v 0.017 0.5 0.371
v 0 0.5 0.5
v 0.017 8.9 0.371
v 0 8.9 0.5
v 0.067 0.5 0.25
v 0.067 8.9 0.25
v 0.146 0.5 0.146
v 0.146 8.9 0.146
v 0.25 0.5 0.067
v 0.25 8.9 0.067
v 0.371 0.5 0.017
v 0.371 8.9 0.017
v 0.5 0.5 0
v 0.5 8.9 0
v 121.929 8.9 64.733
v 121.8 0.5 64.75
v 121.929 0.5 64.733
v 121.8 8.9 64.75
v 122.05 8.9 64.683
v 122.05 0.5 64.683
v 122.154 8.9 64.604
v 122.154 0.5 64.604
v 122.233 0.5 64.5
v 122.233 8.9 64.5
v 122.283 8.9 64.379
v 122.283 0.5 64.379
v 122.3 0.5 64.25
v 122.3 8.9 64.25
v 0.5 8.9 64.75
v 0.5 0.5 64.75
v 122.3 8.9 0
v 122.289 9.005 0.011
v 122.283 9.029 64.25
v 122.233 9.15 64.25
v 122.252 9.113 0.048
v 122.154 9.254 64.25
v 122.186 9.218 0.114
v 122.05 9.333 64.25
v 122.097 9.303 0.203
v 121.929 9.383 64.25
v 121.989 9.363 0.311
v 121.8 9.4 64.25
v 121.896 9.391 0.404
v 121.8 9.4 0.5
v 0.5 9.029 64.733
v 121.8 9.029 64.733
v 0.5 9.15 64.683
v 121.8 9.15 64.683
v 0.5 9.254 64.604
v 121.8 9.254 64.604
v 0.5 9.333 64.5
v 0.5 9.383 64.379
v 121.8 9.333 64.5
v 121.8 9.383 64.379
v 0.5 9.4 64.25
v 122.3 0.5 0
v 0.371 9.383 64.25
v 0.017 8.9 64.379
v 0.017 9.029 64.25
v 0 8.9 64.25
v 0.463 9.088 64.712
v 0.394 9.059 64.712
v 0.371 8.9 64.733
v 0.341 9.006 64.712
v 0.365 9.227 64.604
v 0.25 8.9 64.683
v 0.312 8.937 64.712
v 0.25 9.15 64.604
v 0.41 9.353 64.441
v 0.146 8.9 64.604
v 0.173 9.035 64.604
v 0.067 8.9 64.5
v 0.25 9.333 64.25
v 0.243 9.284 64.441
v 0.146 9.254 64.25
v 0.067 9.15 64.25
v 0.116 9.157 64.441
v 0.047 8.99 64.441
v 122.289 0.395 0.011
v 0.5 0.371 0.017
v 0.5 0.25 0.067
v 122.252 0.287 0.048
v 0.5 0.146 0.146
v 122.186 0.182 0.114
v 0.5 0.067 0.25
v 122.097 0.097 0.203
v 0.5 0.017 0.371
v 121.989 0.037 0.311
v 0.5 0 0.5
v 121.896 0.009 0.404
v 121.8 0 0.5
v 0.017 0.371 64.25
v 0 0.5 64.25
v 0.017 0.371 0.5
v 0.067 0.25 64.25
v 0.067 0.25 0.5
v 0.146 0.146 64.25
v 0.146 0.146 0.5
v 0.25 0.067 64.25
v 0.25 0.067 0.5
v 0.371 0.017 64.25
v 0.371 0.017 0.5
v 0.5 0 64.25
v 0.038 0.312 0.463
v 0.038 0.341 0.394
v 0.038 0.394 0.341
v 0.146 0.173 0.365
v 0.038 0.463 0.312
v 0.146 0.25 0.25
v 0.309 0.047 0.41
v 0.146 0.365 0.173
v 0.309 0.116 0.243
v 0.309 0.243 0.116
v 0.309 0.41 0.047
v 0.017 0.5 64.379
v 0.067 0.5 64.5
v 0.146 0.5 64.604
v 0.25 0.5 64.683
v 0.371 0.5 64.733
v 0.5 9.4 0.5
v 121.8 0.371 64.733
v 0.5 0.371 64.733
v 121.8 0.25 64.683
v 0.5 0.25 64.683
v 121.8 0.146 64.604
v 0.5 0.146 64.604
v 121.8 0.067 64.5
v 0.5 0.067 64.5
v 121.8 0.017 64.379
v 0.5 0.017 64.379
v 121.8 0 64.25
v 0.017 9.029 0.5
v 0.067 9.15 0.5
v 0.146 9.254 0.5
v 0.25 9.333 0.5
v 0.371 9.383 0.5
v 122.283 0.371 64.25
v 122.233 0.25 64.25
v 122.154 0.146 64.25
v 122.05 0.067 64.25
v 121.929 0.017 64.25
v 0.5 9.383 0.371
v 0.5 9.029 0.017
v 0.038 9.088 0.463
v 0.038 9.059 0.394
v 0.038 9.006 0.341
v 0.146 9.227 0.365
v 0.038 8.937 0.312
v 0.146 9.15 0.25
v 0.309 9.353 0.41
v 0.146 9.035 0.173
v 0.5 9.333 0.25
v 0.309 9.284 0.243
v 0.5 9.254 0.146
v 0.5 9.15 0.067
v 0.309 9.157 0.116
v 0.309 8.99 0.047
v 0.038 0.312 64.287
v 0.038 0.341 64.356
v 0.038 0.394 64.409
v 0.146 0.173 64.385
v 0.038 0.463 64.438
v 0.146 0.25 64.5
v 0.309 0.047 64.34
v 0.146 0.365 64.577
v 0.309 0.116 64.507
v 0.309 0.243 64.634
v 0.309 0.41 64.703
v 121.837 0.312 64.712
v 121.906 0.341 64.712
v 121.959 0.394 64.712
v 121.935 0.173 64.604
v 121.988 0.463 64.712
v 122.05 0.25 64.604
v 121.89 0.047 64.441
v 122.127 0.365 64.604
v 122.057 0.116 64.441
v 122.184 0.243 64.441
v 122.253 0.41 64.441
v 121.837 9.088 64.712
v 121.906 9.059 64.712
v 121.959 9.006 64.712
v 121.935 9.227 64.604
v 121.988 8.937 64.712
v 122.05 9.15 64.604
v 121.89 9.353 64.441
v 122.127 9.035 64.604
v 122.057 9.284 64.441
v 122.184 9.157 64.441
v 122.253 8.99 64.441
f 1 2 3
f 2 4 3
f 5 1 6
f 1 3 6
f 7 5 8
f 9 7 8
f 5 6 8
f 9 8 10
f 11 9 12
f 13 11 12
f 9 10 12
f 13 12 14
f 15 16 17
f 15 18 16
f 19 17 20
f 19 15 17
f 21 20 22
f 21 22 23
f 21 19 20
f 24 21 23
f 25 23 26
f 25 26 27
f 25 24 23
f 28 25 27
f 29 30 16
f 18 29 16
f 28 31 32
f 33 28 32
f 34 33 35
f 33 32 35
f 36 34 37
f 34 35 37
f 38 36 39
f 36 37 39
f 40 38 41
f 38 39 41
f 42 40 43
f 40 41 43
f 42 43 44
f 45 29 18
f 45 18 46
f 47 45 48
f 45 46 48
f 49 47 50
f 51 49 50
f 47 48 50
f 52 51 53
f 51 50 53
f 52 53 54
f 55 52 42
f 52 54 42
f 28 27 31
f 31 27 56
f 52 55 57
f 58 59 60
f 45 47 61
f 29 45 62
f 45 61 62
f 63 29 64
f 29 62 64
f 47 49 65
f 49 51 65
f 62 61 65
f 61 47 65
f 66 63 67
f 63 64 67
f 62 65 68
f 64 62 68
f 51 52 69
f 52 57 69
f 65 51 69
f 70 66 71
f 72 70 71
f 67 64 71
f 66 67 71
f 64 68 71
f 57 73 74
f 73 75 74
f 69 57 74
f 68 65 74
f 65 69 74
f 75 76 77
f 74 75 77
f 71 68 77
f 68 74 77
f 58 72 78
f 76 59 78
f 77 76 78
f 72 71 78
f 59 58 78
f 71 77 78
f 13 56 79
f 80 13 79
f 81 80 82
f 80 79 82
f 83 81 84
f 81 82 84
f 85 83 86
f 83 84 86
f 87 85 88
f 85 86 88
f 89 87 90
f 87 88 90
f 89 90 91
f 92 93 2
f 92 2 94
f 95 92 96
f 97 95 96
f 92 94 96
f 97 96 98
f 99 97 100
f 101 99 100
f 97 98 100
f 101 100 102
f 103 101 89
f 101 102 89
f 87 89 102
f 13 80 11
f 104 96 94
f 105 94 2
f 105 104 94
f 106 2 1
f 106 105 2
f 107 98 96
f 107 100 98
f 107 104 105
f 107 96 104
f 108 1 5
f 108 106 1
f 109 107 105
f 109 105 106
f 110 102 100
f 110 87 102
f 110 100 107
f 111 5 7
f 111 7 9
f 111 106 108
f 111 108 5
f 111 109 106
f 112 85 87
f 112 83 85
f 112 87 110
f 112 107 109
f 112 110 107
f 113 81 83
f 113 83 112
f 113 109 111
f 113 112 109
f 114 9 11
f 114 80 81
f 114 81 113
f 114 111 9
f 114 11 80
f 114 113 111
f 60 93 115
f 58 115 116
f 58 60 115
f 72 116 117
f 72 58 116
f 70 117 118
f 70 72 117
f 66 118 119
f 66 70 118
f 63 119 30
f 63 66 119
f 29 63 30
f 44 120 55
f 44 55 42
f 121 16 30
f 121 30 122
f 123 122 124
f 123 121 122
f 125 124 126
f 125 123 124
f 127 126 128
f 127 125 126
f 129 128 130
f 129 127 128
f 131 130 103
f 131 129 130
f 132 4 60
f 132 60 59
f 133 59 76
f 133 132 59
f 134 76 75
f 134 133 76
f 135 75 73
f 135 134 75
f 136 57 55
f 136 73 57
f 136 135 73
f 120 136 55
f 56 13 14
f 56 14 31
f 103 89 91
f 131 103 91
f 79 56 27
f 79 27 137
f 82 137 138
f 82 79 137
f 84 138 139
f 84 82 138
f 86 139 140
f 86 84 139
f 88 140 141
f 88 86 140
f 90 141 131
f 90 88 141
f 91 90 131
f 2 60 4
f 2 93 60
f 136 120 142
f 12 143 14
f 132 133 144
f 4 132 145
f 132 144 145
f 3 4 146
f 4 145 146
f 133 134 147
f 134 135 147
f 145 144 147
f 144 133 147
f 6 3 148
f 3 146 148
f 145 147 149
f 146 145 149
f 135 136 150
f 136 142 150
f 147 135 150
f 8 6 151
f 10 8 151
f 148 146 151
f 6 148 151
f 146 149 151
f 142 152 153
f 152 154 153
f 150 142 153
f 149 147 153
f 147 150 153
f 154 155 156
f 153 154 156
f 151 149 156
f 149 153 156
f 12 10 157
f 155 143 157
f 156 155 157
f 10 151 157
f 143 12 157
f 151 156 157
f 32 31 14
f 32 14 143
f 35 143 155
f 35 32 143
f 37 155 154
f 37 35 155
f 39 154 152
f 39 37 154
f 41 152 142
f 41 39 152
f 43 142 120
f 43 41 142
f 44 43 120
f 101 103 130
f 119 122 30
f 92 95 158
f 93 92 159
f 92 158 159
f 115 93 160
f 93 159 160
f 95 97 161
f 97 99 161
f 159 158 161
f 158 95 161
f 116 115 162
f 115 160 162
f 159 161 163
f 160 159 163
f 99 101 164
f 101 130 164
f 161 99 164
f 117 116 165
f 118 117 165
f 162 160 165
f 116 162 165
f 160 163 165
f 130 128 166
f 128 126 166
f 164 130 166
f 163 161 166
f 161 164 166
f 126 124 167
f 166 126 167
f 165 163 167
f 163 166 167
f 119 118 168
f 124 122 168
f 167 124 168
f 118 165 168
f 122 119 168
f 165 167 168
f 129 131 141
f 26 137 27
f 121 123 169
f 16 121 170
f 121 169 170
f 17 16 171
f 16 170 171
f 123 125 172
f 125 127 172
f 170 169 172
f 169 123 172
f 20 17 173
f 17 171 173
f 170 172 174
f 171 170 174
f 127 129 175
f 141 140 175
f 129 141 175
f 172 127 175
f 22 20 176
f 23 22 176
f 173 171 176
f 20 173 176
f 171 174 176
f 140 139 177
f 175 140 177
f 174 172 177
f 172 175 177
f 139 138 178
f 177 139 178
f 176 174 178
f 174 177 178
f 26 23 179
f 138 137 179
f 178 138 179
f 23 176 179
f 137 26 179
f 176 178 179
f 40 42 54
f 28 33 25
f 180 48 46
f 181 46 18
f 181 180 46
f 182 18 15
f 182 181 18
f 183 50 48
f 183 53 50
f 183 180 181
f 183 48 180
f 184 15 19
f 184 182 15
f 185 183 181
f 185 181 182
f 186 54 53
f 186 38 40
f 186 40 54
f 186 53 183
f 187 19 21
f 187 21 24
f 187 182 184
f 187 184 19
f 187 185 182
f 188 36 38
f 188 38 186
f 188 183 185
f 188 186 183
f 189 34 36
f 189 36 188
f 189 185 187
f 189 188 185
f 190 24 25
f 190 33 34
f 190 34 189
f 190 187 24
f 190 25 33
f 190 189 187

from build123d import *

# Parameters (mm, degrees)
SKETCH_1_W      = 122.3
SKETCH_1_H      = 64.75
EXTRUDE_1_DEPTH = 9.4
FILLET_1_R      = 0.5


with BuildPart() as part:
    # Эскиз1 → Бобышка-Вытянуть1 (new body)
    with BuildSketch(Plane(origin=(0, 0, 0), x_dir=(1, 0, 0), z_dir=(0, 1, 0))):
        with Locations((61.15, -32.375)):
            Rectangle(SKETCH_1_W, SKETCH_1_H)
    extrude(amount=EXTRUDE_1_DEPTH)

    # Скругление1
    fillet_1_edges = [part.edges().sort_by_distance(p)[0] for p in [
        (122.3, 9.4, 32.375),
        (61.15, 9.4, 0),
        (0, 9.4, 32.375),
        (61.15, 0, 0),
        (122.3, 0, 32.375),
        (61.15, 0, 64.75),
        (0, 0, 32.375),
        (61.15, 9.4, 64.75),
        (0, 4.7, 0),
        (122.3, 4.7, 64.75),
        (0, 4.7, 64.75),
    ]]
    fillet(fillet_1_edges, radius=FILLET_1_R)


solid = part.part
